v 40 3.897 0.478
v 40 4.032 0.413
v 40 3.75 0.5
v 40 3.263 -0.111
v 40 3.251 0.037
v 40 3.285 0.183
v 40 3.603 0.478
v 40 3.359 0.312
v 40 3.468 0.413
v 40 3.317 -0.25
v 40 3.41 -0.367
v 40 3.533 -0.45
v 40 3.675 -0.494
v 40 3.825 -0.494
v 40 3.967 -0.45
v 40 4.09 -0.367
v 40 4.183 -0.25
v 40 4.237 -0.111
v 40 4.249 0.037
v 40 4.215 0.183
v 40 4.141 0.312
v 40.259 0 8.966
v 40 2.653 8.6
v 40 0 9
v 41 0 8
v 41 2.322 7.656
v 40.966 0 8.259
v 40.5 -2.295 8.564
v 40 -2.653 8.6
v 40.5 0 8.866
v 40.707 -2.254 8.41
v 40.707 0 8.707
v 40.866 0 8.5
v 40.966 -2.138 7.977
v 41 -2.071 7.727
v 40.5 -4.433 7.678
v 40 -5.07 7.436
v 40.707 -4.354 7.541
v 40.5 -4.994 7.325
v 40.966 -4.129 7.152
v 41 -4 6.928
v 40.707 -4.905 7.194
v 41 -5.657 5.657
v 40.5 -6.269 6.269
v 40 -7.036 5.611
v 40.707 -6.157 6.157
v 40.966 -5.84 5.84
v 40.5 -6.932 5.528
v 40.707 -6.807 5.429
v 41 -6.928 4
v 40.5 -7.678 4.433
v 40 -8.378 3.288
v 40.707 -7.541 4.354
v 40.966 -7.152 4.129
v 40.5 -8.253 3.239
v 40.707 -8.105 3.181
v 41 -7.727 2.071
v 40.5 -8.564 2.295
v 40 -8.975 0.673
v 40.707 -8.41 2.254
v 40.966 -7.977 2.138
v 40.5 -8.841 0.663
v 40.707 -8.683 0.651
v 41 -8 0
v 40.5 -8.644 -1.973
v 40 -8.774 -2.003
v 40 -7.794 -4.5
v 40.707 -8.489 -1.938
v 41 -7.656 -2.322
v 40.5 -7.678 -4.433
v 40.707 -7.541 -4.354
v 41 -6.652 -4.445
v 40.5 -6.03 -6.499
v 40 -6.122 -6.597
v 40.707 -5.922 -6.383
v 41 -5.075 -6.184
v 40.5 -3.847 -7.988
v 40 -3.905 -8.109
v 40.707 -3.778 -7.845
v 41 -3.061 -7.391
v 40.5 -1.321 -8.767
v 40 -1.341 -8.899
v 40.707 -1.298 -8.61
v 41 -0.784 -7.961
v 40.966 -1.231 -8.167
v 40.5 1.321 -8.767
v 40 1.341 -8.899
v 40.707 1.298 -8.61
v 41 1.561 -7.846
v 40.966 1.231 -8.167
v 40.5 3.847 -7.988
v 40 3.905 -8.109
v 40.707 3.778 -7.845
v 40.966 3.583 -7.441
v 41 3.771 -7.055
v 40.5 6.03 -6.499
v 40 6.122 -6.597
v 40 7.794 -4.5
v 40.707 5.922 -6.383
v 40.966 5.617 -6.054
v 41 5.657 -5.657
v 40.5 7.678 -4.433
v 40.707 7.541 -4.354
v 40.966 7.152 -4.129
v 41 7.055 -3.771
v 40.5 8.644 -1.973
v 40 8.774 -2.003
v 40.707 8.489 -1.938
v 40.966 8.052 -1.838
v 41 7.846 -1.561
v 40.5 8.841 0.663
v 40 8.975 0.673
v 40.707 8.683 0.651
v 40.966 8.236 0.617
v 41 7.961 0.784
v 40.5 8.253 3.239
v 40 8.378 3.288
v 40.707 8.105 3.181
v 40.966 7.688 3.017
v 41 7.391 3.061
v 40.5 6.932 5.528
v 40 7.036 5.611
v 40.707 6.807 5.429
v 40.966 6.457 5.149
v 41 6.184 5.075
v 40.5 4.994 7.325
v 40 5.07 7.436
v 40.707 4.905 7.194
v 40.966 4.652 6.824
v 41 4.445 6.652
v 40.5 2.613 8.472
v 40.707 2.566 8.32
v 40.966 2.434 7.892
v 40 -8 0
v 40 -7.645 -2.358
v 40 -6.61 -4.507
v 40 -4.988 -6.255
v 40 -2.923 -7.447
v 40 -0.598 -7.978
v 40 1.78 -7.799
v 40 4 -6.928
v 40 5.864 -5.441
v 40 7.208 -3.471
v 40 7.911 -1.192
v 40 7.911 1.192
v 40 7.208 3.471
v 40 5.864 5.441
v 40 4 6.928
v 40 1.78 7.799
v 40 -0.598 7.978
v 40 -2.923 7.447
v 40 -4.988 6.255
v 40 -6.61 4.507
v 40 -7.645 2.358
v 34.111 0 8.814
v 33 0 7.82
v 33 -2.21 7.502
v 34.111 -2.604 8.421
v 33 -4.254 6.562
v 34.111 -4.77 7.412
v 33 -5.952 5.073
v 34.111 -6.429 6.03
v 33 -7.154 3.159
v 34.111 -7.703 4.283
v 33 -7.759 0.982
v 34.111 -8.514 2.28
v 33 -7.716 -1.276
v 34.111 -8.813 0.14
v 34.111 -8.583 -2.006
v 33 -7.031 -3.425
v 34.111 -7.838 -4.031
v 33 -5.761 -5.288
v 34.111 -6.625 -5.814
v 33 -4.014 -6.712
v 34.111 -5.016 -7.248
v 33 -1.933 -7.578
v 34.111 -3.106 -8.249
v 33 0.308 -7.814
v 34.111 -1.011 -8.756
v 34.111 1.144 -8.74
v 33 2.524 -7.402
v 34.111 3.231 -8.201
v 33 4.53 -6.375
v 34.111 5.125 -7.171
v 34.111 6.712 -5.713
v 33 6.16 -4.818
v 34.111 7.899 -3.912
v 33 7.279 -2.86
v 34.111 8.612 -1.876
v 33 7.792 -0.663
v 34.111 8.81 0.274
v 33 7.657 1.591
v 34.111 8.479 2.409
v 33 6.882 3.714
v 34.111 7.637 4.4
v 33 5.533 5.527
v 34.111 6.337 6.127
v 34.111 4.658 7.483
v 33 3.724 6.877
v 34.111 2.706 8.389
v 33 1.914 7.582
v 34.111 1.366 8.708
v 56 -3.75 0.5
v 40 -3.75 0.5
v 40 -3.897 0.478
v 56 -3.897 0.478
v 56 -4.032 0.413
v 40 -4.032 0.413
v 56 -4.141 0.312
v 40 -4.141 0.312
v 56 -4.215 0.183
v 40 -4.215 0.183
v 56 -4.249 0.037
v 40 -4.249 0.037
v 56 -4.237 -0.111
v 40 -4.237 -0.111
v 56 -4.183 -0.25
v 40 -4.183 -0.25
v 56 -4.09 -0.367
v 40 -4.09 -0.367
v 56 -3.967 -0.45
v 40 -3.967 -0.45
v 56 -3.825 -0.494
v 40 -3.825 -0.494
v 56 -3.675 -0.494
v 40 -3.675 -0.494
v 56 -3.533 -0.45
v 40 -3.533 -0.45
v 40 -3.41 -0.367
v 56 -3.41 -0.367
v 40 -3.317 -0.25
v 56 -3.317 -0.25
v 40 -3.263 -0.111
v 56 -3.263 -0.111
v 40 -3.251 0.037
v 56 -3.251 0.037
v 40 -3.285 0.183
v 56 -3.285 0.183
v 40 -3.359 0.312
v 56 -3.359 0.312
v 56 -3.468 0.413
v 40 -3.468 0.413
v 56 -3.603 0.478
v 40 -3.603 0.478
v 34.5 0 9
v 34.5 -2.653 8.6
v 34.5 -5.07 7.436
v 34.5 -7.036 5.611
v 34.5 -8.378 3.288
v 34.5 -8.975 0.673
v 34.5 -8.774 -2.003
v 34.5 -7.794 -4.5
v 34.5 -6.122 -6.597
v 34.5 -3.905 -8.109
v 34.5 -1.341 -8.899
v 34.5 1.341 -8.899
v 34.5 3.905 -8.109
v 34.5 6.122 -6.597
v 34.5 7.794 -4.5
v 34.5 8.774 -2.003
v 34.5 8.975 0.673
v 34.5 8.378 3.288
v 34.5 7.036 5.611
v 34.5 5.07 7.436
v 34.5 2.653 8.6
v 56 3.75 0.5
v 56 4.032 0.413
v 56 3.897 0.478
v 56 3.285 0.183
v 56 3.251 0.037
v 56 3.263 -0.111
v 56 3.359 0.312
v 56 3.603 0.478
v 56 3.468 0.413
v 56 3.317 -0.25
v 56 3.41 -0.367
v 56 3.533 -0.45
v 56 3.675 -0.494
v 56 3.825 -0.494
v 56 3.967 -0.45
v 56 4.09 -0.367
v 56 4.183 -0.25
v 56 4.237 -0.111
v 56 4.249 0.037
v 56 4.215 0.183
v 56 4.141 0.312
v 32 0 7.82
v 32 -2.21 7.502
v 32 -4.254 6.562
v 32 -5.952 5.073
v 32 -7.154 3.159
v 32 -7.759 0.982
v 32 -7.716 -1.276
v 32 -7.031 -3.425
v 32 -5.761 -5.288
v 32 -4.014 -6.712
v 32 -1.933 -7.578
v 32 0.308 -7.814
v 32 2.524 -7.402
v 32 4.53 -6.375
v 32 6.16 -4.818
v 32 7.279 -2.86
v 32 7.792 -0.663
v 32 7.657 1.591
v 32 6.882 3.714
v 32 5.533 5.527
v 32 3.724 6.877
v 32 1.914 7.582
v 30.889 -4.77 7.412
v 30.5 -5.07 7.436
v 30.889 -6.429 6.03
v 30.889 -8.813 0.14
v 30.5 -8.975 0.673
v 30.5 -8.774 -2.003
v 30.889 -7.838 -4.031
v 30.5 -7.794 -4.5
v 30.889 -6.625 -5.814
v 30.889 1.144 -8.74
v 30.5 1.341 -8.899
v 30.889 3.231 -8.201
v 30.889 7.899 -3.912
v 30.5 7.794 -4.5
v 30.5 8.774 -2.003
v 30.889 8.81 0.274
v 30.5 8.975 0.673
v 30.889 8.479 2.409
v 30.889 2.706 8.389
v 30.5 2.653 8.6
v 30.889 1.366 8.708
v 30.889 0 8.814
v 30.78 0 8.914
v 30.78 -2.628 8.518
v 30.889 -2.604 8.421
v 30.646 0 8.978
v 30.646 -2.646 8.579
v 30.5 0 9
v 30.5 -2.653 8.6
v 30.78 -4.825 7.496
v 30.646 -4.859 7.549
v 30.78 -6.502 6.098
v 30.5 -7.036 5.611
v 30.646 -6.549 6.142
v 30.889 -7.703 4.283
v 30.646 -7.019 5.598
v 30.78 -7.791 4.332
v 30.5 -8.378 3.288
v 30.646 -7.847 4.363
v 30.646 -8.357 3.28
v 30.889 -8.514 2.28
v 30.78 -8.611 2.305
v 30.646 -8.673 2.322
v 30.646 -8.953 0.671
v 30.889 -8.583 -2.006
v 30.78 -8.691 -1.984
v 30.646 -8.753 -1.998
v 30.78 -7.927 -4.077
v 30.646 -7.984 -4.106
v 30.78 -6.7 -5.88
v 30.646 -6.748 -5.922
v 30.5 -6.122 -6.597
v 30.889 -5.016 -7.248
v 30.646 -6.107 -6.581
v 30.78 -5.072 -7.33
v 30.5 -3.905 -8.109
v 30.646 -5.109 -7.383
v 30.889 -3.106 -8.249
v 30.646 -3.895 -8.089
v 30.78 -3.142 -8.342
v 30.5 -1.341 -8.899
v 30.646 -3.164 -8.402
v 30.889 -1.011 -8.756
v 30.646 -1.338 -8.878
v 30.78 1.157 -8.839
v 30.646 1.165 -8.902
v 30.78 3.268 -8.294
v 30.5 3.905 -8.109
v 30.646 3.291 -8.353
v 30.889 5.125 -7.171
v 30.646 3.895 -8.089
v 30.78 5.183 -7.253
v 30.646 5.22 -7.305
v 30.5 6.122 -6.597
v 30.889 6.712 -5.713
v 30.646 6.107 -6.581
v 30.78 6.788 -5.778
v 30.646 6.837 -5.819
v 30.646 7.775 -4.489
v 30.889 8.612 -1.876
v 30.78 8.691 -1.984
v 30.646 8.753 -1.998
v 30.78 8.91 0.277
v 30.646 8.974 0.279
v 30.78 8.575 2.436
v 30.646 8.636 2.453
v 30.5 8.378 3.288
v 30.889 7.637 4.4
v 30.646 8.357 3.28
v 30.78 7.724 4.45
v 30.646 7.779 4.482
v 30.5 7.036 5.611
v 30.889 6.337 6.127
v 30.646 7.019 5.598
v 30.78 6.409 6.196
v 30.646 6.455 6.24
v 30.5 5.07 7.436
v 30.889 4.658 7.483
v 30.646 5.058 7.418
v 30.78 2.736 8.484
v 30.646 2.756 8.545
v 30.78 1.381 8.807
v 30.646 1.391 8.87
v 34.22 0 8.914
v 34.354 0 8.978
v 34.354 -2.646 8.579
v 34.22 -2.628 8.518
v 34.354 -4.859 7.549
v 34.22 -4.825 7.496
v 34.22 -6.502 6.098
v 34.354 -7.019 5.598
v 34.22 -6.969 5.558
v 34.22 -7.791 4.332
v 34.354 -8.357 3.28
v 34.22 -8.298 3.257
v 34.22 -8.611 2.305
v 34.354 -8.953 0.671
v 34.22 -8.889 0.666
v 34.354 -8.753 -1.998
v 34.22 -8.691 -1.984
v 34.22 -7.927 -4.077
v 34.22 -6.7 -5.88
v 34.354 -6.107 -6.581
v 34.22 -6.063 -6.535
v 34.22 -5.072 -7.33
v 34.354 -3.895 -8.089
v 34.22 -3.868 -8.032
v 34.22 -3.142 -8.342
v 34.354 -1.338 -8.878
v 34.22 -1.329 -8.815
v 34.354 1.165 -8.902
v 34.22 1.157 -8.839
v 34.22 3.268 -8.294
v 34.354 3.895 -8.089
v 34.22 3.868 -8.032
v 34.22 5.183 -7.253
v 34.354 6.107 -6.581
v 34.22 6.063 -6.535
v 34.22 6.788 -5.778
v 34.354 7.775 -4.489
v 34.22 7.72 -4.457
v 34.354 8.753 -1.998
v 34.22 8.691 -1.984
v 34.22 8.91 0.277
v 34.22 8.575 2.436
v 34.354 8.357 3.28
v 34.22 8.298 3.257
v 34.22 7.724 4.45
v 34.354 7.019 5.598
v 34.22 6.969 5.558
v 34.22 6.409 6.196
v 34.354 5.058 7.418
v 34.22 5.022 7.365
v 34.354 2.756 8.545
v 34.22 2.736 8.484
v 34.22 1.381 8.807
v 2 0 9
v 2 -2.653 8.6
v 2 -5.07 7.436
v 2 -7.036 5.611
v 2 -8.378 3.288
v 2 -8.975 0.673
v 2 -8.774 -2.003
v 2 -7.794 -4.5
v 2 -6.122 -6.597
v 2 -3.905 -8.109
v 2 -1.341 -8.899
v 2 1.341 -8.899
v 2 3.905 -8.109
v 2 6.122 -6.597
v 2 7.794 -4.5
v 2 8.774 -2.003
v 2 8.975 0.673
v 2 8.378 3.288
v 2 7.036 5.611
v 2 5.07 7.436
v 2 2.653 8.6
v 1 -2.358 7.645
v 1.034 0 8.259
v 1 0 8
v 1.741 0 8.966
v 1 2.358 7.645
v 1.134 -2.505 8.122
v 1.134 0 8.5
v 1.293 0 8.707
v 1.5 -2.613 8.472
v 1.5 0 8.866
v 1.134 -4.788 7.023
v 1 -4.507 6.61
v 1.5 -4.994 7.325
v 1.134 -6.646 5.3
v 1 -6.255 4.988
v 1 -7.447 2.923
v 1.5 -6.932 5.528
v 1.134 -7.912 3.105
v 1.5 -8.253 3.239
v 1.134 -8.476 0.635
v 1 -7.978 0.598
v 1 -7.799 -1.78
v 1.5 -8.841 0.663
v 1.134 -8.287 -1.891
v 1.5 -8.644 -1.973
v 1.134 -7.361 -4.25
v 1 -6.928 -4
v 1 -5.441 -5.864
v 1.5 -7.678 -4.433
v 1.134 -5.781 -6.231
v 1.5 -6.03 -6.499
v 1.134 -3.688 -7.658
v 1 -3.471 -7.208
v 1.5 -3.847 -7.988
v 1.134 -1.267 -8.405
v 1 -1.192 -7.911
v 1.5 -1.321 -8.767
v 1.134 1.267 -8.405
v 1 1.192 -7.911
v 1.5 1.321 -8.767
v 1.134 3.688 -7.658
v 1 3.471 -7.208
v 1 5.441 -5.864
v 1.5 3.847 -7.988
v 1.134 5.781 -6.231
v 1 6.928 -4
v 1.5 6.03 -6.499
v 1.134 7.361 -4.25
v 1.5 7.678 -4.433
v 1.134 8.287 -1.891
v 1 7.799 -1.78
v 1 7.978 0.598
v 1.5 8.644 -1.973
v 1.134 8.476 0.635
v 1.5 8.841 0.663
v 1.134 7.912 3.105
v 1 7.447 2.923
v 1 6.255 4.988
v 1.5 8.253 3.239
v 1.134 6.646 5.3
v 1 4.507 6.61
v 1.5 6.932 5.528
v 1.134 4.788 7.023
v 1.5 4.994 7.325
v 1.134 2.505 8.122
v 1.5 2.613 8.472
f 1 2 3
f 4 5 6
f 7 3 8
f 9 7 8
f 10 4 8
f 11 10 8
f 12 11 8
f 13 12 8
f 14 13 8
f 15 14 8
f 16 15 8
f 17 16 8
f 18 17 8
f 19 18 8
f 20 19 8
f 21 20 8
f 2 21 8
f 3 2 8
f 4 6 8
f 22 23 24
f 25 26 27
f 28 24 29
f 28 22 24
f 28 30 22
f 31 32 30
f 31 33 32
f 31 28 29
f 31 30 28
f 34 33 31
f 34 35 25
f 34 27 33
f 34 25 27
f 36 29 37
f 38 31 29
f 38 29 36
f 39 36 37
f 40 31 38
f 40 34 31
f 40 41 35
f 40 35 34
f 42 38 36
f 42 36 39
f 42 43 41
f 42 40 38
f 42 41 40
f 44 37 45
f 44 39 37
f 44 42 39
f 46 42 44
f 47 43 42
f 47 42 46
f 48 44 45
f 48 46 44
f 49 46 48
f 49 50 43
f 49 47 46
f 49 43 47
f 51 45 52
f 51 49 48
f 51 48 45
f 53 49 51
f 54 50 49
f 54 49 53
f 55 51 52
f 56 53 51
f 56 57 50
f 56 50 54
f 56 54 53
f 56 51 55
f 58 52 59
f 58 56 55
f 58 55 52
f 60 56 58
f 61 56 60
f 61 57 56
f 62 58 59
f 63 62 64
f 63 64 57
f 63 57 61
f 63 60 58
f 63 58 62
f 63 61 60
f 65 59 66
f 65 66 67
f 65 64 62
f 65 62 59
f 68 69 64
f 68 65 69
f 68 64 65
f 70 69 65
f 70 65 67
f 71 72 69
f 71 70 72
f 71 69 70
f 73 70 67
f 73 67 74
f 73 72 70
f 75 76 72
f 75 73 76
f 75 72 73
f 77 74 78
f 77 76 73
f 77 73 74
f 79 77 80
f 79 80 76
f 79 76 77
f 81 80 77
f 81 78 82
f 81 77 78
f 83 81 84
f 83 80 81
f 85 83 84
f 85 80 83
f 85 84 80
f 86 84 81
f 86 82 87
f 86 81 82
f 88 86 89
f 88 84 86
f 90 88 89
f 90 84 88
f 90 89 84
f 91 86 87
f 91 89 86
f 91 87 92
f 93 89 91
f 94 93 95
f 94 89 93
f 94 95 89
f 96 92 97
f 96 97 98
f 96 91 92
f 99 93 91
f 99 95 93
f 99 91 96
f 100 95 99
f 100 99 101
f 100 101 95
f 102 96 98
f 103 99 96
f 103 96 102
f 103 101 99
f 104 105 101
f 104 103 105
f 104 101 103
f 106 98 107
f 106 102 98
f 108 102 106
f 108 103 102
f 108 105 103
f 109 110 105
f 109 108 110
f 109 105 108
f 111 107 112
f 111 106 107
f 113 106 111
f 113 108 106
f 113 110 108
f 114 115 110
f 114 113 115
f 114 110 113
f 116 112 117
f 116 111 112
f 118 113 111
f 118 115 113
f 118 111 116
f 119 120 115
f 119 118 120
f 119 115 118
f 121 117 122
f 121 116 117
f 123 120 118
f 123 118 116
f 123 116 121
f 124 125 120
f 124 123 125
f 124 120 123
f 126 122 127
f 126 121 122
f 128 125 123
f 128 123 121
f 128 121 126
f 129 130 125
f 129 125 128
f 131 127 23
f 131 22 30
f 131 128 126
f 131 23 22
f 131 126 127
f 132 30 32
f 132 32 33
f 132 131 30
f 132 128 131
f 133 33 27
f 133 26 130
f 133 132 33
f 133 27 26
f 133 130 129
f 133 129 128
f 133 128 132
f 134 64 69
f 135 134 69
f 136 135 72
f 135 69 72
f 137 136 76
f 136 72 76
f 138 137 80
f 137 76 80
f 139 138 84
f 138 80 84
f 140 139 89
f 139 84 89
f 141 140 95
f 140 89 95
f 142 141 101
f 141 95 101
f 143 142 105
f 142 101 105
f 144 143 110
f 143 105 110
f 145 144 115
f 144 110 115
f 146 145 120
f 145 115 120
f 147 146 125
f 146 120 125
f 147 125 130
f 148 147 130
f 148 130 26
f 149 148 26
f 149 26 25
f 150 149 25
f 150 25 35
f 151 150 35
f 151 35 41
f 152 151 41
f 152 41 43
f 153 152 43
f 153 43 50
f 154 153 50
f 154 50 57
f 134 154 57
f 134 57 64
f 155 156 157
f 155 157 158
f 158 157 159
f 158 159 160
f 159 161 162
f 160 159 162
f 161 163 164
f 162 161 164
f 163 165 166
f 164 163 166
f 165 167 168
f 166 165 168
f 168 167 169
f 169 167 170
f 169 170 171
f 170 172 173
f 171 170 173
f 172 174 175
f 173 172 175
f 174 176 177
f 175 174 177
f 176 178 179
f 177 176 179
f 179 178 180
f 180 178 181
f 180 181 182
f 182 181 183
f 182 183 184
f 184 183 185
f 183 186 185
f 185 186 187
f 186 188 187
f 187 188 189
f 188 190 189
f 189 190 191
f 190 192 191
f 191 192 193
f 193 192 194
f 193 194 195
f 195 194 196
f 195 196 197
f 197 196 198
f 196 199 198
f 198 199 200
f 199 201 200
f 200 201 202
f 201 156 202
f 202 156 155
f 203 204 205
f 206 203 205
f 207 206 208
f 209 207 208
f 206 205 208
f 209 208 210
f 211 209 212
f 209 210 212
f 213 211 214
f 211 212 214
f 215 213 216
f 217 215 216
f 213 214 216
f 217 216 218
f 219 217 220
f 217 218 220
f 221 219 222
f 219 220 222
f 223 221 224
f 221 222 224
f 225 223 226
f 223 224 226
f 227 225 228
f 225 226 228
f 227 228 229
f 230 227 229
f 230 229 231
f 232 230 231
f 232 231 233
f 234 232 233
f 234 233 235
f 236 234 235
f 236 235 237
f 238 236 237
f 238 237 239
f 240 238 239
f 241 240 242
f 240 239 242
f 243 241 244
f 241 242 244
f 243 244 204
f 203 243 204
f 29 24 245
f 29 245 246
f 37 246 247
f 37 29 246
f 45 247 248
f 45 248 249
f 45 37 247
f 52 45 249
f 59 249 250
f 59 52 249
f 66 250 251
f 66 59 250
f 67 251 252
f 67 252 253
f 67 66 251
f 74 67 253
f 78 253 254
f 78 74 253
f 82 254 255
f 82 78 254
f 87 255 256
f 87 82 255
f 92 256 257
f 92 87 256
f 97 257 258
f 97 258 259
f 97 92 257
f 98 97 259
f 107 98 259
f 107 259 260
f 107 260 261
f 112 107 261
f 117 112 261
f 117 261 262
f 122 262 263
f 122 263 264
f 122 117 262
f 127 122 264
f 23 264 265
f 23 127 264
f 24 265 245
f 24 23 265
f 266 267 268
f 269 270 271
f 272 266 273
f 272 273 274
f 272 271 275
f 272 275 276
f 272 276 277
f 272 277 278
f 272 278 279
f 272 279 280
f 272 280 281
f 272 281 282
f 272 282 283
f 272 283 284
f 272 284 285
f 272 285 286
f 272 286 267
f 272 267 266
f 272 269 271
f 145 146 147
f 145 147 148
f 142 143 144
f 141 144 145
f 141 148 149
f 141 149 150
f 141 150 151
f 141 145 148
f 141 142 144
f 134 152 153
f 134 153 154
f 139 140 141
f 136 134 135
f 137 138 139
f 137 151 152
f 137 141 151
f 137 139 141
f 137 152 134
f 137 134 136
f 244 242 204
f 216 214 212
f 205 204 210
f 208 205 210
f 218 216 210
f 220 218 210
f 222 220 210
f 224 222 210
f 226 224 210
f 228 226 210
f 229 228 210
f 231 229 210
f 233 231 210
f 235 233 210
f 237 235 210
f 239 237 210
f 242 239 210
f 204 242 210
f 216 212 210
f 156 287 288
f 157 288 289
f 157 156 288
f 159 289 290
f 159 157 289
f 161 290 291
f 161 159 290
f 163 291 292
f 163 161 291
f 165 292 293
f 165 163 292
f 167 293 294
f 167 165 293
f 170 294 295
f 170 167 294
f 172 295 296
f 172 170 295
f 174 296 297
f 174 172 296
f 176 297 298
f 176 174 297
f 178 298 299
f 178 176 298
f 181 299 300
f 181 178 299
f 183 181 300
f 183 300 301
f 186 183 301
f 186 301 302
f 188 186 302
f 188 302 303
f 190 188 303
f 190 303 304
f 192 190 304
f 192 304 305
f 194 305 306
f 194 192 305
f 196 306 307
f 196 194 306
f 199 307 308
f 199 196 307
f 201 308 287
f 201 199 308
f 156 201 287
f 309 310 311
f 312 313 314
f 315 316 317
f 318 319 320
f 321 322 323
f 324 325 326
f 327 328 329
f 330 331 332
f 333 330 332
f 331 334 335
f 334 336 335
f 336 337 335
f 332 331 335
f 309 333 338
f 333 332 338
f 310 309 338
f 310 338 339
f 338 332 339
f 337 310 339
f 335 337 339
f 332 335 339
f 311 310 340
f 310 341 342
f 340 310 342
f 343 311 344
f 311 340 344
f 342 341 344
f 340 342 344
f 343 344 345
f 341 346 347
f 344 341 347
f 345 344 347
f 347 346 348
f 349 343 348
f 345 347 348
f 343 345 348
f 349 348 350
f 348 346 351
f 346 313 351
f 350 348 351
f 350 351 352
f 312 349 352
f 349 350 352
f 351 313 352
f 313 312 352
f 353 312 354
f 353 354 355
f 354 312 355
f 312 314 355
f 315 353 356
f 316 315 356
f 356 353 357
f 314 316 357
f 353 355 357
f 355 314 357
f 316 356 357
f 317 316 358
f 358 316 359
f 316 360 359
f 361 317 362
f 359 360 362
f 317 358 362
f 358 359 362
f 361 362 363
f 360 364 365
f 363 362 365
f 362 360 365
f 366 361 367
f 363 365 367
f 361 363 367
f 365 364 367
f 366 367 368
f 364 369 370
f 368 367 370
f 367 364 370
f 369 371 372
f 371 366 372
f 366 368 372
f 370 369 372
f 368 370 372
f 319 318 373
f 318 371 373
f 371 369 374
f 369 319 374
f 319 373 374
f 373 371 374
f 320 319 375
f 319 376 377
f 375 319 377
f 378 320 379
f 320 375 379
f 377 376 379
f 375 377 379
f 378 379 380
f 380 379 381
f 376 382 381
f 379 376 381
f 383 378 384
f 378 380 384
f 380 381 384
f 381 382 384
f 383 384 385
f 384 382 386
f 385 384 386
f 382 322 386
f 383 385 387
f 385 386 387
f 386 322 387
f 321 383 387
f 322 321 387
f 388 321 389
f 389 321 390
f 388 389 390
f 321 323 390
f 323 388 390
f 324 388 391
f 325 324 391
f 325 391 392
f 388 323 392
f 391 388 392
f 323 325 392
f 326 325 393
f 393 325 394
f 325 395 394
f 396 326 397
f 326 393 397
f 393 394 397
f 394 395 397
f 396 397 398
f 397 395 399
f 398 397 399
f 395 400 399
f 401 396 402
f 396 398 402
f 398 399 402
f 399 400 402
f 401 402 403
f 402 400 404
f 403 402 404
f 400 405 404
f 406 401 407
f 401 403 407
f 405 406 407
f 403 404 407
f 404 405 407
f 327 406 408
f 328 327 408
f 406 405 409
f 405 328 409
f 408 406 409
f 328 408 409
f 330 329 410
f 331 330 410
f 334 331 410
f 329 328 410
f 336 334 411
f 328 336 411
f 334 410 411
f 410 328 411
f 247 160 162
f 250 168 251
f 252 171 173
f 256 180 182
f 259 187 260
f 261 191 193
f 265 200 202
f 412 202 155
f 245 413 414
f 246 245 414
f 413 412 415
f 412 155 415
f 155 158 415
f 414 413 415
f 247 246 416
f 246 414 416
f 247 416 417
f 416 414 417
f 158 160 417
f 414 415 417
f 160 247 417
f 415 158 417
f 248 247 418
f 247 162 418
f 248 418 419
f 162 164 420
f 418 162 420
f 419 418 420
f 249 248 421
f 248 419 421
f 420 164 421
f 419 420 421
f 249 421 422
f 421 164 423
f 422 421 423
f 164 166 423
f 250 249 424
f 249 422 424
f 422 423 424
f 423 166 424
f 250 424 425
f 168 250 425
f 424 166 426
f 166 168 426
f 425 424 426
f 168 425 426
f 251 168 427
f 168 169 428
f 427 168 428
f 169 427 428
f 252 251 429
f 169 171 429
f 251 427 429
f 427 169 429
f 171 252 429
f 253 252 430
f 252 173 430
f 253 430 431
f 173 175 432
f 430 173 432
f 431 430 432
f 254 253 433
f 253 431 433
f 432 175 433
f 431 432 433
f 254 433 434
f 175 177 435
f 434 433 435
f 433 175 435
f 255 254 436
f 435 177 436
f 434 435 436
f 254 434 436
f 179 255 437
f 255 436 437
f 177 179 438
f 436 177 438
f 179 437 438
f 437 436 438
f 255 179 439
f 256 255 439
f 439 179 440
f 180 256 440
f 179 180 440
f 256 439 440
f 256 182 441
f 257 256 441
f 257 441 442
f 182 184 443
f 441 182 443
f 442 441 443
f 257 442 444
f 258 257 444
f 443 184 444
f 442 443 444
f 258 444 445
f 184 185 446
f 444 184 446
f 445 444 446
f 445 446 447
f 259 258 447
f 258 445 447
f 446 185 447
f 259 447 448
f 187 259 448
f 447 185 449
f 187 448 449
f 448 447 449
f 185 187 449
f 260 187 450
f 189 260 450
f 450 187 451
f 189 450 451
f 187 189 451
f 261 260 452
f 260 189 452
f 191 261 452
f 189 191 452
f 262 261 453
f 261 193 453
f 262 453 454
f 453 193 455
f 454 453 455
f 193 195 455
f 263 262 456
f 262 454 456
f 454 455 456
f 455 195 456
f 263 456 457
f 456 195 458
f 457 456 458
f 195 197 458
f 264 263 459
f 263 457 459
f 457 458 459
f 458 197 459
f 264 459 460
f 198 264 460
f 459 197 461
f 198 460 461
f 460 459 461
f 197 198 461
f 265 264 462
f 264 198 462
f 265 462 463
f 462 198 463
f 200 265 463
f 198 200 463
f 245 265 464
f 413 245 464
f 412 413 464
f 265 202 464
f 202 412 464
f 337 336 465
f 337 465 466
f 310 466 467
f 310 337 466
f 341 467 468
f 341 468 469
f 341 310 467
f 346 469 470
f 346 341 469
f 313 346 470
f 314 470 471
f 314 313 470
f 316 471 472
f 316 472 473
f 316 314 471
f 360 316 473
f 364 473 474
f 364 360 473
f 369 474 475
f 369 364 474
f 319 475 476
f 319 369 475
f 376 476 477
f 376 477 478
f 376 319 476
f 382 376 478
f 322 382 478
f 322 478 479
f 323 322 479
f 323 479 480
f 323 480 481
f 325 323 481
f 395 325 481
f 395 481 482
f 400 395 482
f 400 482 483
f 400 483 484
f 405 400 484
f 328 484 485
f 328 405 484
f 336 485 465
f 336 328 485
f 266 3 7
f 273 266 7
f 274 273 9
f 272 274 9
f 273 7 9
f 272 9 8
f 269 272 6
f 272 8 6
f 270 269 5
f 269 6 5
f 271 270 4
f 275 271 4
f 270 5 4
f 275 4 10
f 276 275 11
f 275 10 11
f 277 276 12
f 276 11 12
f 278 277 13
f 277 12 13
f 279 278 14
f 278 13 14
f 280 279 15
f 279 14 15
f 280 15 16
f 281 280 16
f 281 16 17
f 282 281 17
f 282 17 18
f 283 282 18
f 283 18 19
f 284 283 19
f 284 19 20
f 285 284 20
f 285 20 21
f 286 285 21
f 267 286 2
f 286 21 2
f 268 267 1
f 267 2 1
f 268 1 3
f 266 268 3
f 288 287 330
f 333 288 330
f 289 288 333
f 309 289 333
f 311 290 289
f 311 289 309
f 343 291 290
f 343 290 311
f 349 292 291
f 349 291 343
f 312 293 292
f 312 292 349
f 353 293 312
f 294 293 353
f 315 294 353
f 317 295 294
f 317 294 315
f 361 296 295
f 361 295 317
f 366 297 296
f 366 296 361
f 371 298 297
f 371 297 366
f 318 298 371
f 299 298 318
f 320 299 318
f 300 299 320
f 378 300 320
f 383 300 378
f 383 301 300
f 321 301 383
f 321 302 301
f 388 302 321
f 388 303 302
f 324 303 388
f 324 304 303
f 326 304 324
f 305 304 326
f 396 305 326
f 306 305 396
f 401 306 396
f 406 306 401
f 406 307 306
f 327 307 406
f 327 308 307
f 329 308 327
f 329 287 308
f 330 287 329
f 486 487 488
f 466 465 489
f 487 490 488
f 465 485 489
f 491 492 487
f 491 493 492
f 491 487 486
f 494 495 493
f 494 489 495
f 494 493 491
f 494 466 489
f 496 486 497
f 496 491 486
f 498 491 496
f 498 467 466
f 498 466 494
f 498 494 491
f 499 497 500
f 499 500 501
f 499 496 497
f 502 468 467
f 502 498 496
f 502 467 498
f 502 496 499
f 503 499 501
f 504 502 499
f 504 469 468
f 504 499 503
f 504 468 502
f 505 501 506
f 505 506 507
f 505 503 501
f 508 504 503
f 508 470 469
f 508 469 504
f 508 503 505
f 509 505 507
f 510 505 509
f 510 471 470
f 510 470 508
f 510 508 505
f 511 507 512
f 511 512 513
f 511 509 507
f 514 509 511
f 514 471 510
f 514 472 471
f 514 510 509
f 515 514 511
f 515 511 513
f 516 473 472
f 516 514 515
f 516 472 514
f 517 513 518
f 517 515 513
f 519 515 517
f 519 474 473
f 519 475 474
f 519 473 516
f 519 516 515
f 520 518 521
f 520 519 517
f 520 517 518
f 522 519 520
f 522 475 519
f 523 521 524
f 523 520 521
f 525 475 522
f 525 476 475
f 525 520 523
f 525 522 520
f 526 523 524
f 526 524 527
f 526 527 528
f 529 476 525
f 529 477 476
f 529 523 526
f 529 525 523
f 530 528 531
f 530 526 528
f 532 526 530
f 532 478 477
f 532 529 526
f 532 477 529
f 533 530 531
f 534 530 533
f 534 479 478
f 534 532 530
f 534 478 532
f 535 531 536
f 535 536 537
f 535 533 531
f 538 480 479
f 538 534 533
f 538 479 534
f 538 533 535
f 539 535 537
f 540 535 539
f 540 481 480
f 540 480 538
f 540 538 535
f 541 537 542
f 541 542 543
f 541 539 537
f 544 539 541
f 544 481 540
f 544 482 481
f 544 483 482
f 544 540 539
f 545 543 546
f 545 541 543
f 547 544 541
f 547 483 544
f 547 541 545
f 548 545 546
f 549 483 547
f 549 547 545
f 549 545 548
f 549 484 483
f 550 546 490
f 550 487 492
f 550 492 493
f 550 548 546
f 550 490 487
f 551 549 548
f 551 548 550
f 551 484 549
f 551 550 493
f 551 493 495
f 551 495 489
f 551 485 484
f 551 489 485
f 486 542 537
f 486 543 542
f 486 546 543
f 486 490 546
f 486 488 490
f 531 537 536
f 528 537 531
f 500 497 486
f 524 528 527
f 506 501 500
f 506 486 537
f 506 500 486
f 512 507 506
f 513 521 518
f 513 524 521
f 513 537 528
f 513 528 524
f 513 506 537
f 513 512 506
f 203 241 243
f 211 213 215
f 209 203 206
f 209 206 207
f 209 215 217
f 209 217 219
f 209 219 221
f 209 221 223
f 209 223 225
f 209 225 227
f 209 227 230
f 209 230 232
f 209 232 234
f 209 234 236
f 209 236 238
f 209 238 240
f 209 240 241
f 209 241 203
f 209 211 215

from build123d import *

# Parameters (mm, degrees)
FILLET_R            = 1
FILLET001_R         = 1
FILLET002_R         = 0.5
CHAMFER_SIZE        = 1
CHAMFER001_SIZE     = 1
CHAMFER001_FACE10_R = 8
POCKET_DEPTH        = 1
CYLINDER_R          = 0.5
CYLINDER_DEPTH      = 16
CYLINDER001_R       = 0.5
CYLINDER001_DEPTH   = 16


with BuildPart() as body:
    # Sketch → Revolution (revolve)
    with BuildSketch(Plane.XZ):
        Polygon((1, 0), (1, 9), (31, 9), (31, 7.820429), (34, 7.820429), (34, 9), (41, 9), (41, 0), (34, 0), (31, 0), align=None)
    revolve(axis=Axis((0, 0, 0), (1, 0, 0)))

    # Fillet
    fillet_edges = [body.edges().sort_by_distance(p)[0] for p in [
        (1, 0, -9),
    ]]
    fillet(fillet_edges, radius=FILLET_R)

    # Fillet001
    fillet001_edges = [body.edges().sort_by_distance(p)[0] for p in [
        (41, 0, -9),
    ]]
    fillet(fillet001_edges, radius=FILLET001_R)

    # Fillet002
    fillet002_edges = [body.edges().sort_by_distance(p)[0] for p in [
        (34, 0, -9),
        (31, 0, -9),
    ]]
    fillet(fillet002_edges, radius=FILLET002_R)

    # Chamfer
    chamfer_edges = [body.edges().sort_by_distance(p)[0] for p in [
        (31, 0, -7.820429),
    ]]
    chamfer(chamfer_edges, length=CHAMFER_SIZE)

    # Chamfer001
    chamfer001_edges = [body.edges().sort_by_distance(p)[0] for p in [
        (34, 0, -7.820429),
    ]]
    chamfer(chamfer001_edges, length=CHAMFER001_SIZE)

    # Chamfer001 Face10 → Pocket (cut)
    with BuildSketch(Plane(origin=(41, 0, 0), x_dir=(0, -1, 0), z_dir=(1, 0, 0))):
        Circle(CHAMFER001_FACE10_R)
    extrude(amount=-POCKET_DEPTH, mode=Mode.SUBTRACT)


with BuildPart() as body001:
    # Cylinder → Cylinder (join)
    with BuildSketch(Plane(origin=(40, 3.75, 0), x_dir=(0, 0, 1), z_dir=(1, 0, 0))):
        Circle(CYLINDER_R)
    extrude(amount=CYLINDER_DEPTH)


with BuildPart() as body002:
    # Cylinder001 → Cylinder001 (join)
    with BuildSketch(Plane(origin=(40, -3.75, 0), x_dir=(0, 0, 1), z_dir=(1, 0, 0))):
        Circle(CYLINDER001_R)
    extrude(amount=CYLINDER001_DEPTH)


solid = Compound([body.part, body001.part, body002.part])
